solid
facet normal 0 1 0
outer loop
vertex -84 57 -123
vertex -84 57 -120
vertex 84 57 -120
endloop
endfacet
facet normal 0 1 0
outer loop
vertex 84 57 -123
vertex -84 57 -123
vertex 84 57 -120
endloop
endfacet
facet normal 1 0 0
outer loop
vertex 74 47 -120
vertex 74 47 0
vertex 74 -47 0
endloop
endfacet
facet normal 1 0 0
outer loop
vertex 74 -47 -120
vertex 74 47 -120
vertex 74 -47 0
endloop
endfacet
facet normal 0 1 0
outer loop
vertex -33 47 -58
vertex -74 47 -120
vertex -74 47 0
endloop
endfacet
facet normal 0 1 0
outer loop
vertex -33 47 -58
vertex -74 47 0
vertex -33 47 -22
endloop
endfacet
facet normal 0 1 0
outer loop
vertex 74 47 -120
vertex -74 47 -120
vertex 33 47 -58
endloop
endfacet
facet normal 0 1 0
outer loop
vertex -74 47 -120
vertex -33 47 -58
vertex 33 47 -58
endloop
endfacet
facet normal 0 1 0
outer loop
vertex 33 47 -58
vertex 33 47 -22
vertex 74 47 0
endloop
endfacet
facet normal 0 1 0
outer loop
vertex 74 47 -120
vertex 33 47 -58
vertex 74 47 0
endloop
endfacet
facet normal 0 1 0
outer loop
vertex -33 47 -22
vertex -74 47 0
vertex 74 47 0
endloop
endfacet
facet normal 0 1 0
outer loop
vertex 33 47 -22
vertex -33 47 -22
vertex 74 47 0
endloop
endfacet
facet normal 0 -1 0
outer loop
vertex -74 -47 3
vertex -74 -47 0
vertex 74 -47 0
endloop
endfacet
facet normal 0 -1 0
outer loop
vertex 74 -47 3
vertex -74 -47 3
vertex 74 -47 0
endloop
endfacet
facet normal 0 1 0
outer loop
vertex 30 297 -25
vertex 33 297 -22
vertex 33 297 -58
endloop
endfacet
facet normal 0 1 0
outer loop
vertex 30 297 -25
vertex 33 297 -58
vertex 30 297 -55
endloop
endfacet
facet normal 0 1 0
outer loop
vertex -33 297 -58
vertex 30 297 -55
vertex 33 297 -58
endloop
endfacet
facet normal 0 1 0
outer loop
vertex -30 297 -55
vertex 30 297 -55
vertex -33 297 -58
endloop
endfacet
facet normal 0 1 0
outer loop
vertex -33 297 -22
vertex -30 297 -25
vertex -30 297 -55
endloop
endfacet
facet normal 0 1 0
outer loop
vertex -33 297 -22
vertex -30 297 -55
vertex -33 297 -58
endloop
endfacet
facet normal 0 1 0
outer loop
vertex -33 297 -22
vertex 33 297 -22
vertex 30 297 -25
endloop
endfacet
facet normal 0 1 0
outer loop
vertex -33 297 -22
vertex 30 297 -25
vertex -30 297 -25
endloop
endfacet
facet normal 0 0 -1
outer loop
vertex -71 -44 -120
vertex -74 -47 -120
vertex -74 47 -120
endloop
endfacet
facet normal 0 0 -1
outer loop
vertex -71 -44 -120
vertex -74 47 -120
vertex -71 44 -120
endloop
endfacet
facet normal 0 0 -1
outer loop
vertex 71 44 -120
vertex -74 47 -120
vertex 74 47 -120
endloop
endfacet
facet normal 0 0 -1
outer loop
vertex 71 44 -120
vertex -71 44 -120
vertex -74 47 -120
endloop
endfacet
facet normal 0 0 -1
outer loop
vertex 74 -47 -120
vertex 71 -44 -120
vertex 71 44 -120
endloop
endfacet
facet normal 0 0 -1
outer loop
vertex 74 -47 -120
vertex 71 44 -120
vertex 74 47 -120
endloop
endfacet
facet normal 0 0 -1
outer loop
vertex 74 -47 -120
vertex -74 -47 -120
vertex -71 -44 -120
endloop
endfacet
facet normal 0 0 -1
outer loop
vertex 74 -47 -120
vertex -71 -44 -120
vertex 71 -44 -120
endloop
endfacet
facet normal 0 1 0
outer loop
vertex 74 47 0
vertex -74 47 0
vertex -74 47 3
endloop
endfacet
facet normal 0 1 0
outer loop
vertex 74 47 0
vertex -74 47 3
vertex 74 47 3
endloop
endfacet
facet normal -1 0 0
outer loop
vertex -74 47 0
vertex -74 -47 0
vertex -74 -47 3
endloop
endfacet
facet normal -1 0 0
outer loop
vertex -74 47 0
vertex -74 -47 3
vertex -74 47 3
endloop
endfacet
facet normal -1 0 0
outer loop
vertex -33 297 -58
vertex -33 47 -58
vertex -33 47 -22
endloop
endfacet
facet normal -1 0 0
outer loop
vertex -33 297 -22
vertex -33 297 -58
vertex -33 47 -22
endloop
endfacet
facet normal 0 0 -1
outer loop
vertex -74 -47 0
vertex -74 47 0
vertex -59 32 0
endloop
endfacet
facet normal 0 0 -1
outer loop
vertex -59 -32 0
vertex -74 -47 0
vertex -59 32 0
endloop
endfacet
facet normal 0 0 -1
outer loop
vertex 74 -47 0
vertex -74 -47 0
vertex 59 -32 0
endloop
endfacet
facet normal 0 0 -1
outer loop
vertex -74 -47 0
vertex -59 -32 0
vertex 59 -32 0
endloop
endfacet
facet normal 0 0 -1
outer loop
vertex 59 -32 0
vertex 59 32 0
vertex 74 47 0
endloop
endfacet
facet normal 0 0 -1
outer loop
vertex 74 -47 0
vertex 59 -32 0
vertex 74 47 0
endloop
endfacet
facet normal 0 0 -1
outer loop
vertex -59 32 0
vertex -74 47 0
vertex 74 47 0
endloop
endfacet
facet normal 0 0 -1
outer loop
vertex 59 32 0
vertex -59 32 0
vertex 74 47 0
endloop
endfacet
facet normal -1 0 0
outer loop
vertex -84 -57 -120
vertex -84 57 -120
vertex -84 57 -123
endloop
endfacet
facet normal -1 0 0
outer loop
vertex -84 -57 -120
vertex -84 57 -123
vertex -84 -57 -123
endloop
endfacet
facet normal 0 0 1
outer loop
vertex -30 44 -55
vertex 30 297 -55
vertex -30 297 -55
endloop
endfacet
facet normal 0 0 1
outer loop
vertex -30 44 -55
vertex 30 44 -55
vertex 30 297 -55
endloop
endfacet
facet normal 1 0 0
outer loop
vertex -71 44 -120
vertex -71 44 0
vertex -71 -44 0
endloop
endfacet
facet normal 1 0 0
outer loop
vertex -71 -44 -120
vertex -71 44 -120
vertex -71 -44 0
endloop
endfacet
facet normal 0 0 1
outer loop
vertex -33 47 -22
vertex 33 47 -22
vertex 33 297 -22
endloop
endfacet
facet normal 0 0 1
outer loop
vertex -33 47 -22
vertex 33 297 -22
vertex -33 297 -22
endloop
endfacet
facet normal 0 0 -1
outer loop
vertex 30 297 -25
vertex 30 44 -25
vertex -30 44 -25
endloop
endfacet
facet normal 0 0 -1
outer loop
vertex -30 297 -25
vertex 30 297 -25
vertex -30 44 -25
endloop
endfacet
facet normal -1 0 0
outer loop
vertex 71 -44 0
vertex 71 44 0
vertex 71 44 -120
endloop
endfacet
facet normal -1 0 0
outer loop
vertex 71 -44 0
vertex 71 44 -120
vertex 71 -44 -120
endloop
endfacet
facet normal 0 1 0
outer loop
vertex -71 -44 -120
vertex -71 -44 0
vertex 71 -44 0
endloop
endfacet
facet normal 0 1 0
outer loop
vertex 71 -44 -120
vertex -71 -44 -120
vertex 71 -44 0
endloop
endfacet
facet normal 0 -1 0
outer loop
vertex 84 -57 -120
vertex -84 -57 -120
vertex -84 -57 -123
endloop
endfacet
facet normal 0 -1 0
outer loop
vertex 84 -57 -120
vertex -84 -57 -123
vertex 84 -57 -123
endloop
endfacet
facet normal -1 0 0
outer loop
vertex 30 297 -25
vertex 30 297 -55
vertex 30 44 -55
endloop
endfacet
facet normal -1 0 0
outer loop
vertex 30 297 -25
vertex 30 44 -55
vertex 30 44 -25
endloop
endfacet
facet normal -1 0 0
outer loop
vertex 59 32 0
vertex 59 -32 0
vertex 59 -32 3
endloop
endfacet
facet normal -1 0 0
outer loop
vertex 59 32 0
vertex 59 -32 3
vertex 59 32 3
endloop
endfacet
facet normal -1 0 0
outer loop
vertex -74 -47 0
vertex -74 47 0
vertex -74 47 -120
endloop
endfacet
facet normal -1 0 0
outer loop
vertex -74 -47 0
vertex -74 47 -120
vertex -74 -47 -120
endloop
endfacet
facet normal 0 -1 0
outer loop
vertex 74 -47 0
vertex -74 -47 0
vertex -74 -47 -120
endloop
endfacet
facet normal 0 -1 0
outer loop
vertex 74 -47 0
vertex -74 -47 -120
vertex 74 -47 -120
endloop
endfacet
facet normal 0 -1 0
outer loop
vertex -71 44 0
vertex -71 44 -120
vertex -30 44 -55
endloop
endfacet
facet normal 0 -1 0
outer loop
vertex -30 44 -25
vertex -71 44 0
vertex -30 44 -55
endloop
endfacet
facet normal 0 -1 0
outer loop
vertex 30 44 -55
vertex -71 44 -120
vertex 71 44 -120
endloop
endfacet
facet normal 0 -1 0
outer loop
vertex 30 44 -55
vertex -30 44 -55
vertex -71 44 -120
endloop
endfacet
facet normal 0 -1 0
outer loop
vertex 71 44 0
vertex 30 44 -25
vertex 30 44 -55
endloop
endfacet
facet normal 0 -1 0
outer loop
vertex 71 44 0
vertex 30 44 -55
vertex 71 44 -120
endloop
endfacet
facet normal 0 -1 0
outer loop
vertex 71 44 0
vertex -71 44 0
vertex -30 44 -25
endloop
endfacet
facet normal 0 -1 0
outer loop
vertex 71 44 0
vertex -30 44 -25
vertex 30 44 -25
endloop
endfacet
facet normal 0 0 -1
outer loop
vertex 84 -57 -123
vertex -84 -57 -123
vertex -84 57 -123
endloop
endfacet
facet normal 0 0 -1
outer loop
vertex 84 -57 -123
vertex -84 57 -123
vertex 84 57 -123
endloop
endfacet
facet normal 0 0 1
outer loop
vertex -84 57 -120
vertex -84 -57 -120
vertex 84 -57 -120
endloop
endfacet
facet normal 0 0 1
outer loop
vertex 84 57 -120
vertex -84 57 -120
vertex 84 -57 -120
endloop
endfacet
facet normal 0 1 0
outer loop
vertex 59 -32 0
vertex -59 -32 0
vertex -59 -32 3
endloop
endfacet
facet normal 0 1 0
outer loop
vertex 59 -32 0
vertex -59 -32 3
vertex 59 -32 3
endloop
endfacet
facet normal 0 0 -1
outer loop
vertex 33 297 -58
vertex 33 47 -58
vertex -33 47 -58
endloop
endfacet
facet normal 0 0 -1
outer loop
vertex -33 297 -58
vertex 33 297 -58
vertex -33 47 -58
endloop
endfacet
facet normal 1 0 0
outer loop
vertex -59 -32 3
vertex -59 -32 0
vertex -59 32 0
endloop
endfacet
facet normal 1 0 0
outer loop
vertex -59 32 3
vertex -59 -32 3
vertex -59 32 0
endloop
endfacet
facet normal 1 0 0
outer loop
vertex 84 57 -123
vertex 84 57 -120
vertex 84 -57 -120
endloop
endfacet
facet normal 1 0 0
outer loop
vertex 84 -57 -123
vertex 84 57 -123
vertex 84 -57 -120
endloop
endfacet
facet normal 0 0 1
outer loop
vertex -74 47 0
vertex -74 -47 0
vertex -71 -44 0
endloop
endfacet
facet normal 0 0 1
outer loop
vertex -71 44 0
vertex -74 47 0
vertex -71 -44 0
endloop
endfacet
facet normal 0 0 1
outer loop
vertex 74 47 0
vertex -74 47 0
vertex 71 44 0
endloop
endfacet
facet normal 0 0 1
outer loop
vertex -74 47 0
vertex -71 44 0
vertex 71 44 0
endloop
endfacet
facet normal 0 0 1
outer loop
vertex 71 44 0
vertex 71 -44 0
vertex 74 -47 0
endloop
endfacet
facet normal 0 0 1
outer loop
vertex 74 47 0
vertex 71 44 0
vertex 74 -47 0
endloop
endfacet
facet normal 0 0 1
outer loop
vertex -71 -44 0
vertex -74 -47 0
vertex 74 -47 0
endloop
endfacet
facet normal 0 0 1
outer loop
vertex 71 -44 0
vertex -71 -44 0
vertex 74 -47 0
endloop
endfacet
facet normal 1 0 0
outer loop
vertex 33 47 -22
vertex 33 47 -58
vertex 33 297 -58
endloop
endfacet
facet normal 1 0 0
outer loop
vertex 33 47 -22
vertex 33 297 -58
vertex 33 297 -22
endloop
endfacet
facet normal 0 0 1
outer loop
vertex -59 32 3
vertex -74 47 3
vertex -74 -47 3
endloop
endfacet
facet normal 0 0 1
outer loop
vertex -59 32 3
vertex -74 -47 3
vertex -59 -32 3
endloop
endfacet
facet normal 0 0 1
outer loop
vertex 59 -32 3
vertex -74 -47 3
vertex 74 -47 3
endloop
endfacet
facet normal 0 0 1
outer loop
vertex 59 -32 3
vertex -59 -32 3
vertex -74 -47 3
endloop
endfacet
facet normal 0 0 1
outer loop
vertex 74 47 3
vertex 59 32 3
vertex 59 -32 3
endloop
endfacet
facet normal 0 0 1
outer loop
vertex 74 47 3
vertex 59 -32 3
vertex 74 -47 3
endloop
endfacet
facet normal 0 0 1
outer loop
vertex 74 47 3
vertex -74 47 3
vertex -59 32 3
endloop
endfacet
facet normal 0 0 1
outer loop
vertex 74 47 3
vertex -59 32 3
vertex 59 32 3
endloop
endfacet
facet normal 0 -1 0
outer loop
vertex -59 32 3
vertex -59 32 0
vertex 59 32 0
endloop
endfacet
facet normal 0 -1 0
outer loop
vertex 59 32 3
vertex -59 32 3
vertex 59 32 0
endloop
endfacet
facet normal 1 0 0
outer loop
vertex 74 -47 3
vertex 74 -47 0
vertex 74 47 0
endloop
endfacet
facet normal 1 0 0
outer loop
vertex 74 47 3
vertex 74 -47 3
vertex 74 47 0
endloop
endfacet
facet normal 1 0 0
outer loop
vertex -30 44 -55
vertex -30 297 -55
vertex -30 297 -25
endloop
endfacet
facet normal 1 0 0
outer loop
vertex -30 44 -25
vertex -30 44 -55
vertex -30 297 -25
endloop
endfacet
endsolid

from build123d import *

# Parameters (mm, degrees)
F0_W     = 148
F0_H     = 94
F0_W_2   = 118
F0_H_2   = 64
F1_DEPTH = 3
F2_W     = 148
F2_H     = 94
F2_W_2   = 142
F2_H_2   = 88
F3_DEPTH = 120
F4_W     = 60
F4_H     = 30
F5_DEPTH = 4
F6_W     = 168
F6_H     = 114
F6_W_2   = 148
F6_H_2   = 94
F6_W_3   = 142
F6_H_3   = 88
F7_DEPTH = 3
F8_W     = 66
F8_H     = 36
F8_W_2   = 60
F8_H_2   = 30
F9_DEPTH = 250


with BuildPart() as f1:
    # F0 (on Top) → F1 (new body)
    with BuildSketch(Plane.XY):
        Rectangle(F0_W, F0_H)
        Rectangle(F0_W_2, F0_H_2, mode=Mode.SUBTRACT)
    extrude(amount=F1_DEPTH)


with BuildPart() as f3:
    # F2 (on face) → F3 (new body)
    with BuildSketch(Plane(origin=(0, 0, 0), x_dir=(1, 0, 0), z_dir=(0, 0, -1))):
        Rectangle(F2_W, F2_H)
        Rectangle(F2_W_2, F2_H_2, mode=Mode.SUBTRACT)
    extrude(amount=F3_DEPTH)

    # F4 (on face) → F5 (cut)
    with BuildSketch(Plane(origin=(0, 47, 0), x_dir=(-1, 0, 0), z_dir=(0, 1, 0))):
        with Locations((0, -40)):
            Rectangle(F4_W, F4_H)
    extrude(amount=-F5_DEPTH, mode=Mode.SUBTRACT)

    # F8 (on face) → F9 (join)
    with BuildSketch(Plane(origin=(0, 47, 0), x_dir=(-1, 0, 0), z_dir=(0, 1, 0))):
        with Locations((0, -40)):
            Rectangle(F8_W, F8_H)
        with Locations((0, -40)):
            Rectangle(F8_W_2, F8_H_2, mode=Mode.SUBTRACT)
    extrude(amount=F9_DEPTH)


with BuildPart() as f7:
    # F6 (on face) → F7 (new body)
    with BuildSketch(Plane(origin=(0, 0, -120), x_dir=(1, 0, 0), z_dir=(0, 0, -1))):
        Rectangle(F6_W, F6_H)
        Rectangle(F6_W_2, F6_H_2, mode=Mode.SUBTRACT)
        Rectangle(F6_W_2, F6_H_2)
        Rectangle(F6_W_3, F6_H_3, mode=Mode.SUBTRACT)
        Rectangle(F6_W_3, F6_H_3)
    extrude(amount=F7_DEPTH)


solid = Compound([f1.part, f3.part, f7.part])
